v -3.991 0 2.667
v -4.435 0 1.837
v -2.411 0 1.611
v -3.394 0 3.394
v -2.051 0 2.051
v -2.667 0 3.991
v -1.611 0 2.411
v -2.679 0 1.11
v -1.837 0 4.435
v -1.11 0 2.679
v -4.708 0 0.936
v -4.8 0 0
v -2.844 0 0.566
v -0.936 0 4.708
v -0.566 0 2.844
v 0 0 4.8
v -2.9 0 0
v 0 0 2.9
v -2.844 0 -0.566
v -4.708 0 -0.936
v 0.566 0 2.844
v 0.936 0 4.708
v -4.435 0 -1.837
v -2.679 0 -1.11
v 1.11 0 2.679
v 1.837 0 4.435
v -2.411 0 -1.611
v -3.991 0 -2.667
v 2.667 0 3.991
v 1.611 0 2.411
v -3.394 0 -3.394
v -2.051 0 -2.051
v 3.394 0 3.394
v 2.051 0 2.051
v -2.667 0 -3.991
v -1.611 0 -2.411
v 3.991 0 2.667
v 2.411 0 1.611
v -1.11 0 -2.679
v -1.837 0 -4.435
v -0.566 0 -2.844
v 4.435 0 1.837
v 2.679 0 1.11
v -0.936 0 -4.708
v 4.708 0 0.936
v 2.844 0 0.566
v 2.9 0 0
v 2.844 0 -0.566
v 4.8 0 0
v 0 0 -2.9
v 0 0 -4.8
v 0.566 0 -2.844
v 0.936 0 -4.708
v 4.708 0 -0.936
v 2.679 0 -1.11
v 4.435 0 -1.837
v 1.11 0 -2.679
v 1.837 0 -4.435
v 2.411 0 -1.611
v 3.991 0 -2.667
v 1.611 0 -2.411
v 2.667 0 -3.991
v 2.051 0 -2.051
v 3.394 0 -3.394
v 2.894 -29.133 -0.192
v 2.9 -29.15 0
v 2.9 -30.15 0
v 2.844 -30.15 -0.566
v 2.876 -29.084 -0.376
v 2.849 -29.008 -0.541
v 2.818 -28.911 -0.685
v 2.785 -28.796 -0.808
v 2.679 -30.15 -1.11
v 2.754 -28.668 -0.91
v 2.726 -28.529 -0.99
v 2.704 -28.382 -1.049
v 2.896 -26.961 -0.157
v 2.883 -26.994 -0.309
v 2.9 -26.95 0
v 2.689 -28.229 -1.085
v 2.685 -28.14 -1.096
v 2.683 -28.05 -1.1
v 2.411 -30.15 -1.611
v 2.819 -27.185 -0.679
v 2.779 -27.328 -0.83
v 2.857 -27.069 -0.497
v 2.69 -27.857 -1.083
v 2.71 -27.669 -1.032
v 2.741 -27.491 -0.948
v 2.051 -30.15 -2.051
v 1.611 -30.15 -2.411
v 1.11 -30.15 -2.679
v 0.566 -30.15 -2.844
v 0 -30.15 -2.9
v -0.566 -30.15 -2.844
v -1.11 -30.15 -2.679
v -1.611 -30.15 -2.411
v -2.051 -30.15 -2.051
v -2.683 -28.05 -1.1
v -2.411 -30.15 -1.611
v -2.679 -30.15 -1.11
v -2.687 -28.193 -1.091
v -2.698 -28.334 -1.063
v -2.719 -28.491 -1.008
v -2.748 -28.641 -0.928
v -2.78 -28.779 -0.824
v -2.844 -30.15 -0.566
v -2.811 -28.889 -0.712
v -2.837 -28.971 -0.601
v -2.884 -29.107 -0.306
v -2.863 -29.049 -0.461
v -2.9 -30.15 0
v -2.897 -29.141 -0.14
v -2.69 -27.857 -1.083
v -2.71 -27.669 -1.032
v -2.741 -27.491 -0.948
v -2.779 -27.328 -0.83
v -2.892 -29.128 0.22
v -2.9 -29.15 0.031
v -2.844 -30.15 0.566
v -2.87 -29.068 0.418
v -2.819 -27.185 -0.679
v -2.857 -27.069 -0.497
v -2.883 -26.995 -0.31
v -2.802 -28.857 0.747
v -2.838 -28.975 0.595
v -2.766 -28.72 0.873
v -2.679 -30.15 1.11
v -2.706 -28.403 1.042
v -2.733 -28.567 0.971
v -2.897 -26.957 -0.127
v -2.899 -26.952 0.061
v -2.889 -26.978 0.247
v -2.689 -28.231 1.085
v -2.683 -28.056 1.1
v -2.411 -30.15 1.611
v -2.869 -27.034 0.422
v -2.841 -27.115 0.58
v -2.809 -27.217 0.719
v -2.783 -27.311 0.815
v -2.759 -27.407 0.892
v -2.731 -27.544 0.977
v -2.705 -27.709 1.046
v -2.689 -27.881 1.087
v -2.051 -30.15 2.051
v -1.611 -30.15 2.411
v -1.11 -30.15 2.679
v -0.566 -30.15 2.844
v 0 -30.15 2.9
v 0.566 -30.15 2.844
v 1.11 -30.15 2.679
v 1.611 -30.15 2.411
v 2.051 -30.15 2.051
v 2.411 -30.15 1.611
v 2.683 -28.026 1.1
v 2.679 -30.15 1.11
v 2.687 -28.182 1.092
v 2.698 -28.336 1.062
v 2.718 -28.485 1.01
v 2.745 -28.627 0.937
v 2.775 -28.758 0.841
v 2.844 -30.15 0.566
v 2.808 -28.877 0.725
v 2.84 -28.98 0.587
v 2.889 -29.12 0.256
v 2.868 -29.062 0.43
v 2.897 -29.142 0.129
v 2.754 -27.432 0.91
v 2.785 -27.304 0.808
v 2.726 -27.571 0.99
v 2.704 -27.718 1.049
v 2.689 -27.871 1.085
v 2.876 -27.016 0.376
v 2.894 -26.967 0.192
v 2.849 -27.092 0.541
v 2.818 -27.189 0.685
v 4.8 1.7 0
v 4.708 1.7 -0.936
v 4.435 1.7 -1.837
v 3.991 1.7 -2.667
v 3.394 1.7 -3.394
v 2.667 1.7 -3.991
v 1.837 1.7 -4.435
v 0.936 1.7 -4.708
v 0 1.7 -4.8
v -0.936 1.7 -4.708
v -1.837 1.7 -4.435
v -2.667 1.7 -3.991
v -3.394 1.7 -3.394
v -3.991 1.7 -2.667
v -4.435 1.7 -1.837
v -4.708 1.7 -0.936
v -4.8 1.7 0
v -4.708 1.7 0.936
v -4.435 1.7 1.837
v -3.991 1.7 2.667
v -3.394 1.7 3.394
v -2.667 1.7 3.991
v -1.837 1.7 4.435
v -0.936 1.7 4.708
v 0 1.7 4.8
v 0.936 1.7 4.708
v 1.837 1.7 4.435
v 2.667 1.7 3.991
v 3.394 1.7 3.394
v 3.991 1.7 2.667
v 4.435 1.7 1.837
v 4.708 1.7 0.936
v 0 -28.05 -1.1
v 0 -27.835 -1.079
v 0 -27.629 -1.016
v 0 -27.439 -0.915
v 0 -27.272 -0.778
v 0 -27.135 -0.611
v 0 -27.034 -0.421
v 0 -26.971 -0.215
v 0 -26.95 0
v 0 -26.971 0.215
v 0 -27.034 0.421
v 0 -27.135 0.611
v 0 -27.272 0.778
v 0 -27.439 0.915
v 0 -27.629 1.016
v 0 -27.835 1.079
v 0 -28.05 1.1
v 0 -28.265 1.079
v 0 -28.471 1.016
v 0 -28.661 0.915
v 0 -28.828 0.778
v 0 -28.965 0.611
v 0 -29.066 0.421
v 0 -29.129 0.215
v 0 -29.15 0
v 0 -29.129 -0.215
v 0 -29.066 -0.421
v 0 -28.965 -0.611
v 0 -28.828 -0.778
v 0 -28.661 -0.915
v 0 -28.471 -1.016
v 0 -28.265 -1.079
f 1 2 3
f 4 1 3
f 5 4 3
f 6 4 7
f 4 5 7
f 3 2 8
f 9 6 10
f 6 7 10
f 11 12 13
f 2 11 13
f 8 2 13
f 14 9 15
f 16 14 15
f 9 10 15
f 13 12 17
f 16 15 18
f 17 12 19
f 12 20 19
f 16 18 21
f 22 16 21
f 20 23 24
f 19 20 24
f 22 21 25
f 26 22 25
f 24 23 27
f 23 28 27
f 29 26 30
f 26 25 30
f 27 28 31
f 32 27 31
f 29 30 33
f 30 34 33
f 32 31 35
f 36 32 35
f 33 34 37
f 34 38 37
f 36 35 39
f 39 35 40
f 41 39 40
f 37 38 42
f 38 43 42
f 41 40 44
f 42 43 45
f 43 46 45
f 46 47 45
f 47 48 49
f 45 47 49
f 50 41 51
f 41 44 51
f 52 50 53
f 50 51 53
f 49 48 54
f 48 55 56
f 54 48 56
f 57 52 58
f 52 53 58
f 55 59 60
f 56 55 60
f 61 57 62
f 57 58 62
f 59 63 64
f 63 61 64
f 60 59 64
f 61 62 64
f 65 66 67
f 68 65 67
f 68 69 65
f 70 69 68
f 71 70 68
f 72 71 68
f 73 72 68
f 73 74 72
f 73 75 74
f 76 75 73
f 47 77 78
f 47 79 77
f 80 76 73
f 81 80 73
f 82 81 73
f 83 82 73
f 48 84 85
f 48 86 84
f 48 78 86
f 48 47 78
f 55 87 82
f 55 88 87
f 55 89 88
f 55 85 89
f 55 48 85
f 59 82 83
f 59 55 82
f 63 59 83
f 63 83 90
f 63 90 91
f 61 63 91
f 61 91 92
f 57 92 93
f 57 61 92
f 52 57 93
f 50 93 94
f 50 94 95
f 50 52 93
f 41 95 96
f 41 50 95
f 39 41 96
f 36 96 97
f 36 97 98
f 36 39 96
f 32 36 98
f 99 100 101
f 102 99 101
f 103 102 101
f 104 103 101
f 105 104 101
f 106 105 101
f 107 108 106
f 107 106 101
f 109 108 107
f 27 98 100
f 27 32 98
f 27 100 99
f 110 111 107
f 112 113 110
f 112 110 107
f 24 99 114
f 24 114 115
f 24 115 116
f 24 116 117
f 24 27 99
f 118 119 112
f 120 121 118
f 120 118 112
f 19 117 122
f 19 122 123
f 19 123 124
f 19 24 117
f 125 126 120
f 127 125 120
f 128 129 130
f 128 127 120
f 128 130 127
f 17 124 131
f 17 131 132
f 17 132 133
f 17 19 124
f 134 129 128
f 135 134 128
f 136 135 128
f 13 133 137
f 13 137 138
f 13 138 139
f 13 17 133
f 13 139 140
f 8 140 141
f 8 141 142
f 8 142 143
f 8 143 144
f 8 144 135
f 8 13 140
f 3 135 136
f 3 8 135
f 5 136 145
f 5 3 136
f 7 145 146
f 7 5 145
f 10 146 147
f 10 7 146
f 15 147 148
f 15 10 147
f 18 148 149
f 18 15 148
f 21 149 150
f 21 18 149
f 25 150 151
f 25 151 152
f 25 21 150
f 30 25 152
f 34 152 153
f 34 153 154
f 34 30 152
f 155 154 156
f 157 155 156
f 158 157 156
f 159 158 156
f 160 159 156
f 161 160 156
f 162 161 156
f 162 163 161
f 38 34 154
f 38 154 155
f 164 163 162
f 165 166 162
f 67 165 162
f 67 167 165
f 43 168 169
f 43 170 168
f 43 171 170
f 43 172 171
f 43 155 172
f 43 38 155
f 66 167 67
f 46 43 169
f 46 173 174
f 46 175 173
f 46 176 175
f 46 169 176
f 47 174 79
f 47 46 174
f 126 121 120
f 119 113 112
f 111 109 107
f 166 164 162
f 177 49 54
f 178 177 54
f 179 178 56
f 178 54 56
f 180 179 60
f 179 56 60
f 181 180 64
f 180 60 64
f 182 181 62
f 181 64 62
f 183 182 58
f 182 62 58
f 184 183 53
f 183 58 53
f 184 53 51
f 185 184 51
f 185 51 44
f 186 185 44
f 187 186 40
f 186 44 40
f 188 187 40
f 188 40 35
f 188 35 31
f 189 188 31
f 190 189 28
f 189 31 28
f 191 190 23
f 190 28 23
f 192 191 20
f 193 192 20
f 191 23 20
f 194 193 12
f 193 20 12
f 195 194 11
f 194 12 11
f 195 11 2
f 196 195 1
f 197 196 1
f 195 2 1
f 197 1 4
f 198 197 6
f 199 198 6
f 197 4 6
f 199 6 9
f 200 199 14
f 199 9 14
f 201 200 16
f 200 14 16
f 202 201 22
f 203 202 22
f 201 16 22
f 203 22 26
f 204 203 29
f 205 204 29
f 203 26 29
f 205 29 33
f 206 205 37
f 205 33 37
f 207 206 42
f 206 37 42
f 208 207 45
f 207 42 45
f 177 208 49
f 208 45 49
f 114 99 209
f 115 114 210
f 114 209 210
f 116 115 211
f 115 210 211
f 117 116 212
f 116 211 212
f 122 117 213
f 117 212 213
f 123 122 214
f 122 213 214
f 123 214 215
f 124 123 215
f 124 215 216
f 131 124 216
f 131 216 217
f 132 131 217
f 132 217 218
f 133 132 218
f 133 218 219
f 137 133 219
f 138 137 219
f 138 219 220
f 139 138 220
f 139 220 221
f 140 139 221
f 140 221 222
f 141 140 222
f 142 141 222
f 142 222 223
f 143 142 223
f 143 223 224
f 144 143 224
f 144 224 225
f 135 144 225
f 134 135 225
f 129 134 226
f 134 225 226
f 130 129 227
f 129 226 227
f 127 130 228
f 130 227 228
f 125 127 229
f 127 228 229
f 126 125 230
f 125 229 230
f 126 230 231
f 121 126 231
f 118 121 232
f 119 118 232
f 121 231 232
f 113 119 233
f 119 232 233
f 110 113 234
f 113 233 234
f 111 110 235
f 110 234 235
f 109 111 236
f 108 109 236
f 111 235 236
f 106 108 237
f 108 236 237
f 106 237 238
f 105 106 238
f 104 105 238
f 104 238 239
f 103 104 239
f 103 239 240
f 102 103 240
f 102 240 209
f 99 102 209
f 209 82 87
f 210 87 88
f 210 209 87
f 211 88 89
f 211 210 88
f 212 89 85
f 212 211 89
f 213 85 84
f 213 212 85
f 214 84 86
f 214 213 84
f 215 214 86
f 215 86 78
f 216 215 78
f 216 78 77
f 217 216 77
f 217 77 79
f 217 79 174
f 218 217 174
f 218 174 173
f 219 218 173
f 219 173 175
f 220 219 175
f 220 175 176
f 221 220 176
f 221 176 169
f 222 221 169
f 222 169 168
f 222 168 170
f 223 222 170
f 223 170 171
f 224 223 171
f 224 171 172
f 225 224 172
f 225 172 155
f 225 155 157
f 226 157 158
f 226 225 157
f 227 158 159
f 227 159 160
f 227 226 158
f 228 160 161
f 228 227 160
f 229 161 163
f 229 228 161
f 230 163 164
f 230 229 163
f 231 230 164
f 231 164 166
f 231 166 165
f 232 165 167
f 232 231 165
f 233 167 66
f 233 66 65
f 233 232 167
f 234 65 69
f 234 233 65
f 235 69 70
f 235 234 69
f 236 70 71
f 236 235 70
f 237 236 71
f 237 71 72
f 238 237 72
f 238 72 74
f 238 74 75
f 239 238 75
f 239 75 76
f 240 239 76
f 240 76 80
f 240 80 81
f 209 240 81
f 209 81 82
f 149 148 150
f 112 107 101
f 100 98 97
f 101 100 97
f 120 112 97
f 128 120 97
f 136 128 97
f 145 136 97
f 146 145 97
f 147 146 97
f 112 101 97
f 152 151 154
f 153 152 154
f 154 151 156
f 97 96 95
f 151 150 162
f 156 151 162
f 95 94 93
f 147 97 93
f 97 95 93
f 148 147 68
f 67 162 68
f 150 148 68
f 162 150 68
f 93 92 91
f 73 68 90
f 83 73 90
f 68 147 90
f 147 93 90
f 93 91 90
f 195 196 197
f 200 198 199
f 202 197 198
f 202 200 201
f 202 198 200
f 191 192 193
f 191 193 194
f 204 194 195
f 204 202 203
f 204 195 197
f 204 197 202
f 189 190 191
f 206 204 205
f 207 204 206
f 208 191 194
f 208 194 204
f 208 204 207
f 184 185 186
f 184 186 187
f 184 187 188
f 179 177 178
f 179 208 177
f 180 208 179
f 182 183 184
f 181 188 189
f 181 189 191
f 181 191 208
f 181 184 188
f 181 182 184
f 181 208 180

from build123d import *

# Parameters (mm, degrees)
SKETCH1_R               = 2.9
BOSS_EXTRUDE1_DEPTH     = 30.15
SKETCH2_R               = 4.8
BOSS_EXTRUDE2_DEPTH     = 1.7
SKETCH3_R               = 1.1
CUT_EXTRUDE1_DEPTH      = 5.8
CUT_EXTRUDE1_DEPTH_BACK = 5.8


with BuildPart() as part:
    # Sketch1 → Boss-Extrude1 (new body)
    with BuildSketch(Plane(origin=(0, 0, 0), x_dir=(1, 0, 0), z_dir=(0, 1, 0))):
        Circle(SKETCH1_R)
    extrude(amount=-BOSS_EXTRUDE1_DEPTH)

    # Sketch2 → Boss-Extrude2 (add)
    with BuildSketch(Plane(origin=(0, 0, 0), x_dir=(1, 0, 0), z_dir=(0, 1, 0))):
        Circle(SKETCH2_R)
    extrude(amount=BOSS_EXTRUDE2_DEPTH)

    # Sketch3 → Cut-Extrude1 (cut, two sides)
    with BuildSketch(Plane(origin=(0, 0, 0), x_dir=(0, 0, -1), z_dir=(1, 0, 0))) as cut_extrude1_sk:
        with Locations((0, -28.05)):
            Circle(SKETCH3_R)
    extrude(amount=CUT_EXTRUDE1_DEPTH, mode=Mode.SUBTRACT)
    extrude(cut_extrude1_sk.sketch, amount=-CUT_EXTRUDE1_DEPTH_BACK, mode=Mode.SUBTRACT)


solid = part.part
